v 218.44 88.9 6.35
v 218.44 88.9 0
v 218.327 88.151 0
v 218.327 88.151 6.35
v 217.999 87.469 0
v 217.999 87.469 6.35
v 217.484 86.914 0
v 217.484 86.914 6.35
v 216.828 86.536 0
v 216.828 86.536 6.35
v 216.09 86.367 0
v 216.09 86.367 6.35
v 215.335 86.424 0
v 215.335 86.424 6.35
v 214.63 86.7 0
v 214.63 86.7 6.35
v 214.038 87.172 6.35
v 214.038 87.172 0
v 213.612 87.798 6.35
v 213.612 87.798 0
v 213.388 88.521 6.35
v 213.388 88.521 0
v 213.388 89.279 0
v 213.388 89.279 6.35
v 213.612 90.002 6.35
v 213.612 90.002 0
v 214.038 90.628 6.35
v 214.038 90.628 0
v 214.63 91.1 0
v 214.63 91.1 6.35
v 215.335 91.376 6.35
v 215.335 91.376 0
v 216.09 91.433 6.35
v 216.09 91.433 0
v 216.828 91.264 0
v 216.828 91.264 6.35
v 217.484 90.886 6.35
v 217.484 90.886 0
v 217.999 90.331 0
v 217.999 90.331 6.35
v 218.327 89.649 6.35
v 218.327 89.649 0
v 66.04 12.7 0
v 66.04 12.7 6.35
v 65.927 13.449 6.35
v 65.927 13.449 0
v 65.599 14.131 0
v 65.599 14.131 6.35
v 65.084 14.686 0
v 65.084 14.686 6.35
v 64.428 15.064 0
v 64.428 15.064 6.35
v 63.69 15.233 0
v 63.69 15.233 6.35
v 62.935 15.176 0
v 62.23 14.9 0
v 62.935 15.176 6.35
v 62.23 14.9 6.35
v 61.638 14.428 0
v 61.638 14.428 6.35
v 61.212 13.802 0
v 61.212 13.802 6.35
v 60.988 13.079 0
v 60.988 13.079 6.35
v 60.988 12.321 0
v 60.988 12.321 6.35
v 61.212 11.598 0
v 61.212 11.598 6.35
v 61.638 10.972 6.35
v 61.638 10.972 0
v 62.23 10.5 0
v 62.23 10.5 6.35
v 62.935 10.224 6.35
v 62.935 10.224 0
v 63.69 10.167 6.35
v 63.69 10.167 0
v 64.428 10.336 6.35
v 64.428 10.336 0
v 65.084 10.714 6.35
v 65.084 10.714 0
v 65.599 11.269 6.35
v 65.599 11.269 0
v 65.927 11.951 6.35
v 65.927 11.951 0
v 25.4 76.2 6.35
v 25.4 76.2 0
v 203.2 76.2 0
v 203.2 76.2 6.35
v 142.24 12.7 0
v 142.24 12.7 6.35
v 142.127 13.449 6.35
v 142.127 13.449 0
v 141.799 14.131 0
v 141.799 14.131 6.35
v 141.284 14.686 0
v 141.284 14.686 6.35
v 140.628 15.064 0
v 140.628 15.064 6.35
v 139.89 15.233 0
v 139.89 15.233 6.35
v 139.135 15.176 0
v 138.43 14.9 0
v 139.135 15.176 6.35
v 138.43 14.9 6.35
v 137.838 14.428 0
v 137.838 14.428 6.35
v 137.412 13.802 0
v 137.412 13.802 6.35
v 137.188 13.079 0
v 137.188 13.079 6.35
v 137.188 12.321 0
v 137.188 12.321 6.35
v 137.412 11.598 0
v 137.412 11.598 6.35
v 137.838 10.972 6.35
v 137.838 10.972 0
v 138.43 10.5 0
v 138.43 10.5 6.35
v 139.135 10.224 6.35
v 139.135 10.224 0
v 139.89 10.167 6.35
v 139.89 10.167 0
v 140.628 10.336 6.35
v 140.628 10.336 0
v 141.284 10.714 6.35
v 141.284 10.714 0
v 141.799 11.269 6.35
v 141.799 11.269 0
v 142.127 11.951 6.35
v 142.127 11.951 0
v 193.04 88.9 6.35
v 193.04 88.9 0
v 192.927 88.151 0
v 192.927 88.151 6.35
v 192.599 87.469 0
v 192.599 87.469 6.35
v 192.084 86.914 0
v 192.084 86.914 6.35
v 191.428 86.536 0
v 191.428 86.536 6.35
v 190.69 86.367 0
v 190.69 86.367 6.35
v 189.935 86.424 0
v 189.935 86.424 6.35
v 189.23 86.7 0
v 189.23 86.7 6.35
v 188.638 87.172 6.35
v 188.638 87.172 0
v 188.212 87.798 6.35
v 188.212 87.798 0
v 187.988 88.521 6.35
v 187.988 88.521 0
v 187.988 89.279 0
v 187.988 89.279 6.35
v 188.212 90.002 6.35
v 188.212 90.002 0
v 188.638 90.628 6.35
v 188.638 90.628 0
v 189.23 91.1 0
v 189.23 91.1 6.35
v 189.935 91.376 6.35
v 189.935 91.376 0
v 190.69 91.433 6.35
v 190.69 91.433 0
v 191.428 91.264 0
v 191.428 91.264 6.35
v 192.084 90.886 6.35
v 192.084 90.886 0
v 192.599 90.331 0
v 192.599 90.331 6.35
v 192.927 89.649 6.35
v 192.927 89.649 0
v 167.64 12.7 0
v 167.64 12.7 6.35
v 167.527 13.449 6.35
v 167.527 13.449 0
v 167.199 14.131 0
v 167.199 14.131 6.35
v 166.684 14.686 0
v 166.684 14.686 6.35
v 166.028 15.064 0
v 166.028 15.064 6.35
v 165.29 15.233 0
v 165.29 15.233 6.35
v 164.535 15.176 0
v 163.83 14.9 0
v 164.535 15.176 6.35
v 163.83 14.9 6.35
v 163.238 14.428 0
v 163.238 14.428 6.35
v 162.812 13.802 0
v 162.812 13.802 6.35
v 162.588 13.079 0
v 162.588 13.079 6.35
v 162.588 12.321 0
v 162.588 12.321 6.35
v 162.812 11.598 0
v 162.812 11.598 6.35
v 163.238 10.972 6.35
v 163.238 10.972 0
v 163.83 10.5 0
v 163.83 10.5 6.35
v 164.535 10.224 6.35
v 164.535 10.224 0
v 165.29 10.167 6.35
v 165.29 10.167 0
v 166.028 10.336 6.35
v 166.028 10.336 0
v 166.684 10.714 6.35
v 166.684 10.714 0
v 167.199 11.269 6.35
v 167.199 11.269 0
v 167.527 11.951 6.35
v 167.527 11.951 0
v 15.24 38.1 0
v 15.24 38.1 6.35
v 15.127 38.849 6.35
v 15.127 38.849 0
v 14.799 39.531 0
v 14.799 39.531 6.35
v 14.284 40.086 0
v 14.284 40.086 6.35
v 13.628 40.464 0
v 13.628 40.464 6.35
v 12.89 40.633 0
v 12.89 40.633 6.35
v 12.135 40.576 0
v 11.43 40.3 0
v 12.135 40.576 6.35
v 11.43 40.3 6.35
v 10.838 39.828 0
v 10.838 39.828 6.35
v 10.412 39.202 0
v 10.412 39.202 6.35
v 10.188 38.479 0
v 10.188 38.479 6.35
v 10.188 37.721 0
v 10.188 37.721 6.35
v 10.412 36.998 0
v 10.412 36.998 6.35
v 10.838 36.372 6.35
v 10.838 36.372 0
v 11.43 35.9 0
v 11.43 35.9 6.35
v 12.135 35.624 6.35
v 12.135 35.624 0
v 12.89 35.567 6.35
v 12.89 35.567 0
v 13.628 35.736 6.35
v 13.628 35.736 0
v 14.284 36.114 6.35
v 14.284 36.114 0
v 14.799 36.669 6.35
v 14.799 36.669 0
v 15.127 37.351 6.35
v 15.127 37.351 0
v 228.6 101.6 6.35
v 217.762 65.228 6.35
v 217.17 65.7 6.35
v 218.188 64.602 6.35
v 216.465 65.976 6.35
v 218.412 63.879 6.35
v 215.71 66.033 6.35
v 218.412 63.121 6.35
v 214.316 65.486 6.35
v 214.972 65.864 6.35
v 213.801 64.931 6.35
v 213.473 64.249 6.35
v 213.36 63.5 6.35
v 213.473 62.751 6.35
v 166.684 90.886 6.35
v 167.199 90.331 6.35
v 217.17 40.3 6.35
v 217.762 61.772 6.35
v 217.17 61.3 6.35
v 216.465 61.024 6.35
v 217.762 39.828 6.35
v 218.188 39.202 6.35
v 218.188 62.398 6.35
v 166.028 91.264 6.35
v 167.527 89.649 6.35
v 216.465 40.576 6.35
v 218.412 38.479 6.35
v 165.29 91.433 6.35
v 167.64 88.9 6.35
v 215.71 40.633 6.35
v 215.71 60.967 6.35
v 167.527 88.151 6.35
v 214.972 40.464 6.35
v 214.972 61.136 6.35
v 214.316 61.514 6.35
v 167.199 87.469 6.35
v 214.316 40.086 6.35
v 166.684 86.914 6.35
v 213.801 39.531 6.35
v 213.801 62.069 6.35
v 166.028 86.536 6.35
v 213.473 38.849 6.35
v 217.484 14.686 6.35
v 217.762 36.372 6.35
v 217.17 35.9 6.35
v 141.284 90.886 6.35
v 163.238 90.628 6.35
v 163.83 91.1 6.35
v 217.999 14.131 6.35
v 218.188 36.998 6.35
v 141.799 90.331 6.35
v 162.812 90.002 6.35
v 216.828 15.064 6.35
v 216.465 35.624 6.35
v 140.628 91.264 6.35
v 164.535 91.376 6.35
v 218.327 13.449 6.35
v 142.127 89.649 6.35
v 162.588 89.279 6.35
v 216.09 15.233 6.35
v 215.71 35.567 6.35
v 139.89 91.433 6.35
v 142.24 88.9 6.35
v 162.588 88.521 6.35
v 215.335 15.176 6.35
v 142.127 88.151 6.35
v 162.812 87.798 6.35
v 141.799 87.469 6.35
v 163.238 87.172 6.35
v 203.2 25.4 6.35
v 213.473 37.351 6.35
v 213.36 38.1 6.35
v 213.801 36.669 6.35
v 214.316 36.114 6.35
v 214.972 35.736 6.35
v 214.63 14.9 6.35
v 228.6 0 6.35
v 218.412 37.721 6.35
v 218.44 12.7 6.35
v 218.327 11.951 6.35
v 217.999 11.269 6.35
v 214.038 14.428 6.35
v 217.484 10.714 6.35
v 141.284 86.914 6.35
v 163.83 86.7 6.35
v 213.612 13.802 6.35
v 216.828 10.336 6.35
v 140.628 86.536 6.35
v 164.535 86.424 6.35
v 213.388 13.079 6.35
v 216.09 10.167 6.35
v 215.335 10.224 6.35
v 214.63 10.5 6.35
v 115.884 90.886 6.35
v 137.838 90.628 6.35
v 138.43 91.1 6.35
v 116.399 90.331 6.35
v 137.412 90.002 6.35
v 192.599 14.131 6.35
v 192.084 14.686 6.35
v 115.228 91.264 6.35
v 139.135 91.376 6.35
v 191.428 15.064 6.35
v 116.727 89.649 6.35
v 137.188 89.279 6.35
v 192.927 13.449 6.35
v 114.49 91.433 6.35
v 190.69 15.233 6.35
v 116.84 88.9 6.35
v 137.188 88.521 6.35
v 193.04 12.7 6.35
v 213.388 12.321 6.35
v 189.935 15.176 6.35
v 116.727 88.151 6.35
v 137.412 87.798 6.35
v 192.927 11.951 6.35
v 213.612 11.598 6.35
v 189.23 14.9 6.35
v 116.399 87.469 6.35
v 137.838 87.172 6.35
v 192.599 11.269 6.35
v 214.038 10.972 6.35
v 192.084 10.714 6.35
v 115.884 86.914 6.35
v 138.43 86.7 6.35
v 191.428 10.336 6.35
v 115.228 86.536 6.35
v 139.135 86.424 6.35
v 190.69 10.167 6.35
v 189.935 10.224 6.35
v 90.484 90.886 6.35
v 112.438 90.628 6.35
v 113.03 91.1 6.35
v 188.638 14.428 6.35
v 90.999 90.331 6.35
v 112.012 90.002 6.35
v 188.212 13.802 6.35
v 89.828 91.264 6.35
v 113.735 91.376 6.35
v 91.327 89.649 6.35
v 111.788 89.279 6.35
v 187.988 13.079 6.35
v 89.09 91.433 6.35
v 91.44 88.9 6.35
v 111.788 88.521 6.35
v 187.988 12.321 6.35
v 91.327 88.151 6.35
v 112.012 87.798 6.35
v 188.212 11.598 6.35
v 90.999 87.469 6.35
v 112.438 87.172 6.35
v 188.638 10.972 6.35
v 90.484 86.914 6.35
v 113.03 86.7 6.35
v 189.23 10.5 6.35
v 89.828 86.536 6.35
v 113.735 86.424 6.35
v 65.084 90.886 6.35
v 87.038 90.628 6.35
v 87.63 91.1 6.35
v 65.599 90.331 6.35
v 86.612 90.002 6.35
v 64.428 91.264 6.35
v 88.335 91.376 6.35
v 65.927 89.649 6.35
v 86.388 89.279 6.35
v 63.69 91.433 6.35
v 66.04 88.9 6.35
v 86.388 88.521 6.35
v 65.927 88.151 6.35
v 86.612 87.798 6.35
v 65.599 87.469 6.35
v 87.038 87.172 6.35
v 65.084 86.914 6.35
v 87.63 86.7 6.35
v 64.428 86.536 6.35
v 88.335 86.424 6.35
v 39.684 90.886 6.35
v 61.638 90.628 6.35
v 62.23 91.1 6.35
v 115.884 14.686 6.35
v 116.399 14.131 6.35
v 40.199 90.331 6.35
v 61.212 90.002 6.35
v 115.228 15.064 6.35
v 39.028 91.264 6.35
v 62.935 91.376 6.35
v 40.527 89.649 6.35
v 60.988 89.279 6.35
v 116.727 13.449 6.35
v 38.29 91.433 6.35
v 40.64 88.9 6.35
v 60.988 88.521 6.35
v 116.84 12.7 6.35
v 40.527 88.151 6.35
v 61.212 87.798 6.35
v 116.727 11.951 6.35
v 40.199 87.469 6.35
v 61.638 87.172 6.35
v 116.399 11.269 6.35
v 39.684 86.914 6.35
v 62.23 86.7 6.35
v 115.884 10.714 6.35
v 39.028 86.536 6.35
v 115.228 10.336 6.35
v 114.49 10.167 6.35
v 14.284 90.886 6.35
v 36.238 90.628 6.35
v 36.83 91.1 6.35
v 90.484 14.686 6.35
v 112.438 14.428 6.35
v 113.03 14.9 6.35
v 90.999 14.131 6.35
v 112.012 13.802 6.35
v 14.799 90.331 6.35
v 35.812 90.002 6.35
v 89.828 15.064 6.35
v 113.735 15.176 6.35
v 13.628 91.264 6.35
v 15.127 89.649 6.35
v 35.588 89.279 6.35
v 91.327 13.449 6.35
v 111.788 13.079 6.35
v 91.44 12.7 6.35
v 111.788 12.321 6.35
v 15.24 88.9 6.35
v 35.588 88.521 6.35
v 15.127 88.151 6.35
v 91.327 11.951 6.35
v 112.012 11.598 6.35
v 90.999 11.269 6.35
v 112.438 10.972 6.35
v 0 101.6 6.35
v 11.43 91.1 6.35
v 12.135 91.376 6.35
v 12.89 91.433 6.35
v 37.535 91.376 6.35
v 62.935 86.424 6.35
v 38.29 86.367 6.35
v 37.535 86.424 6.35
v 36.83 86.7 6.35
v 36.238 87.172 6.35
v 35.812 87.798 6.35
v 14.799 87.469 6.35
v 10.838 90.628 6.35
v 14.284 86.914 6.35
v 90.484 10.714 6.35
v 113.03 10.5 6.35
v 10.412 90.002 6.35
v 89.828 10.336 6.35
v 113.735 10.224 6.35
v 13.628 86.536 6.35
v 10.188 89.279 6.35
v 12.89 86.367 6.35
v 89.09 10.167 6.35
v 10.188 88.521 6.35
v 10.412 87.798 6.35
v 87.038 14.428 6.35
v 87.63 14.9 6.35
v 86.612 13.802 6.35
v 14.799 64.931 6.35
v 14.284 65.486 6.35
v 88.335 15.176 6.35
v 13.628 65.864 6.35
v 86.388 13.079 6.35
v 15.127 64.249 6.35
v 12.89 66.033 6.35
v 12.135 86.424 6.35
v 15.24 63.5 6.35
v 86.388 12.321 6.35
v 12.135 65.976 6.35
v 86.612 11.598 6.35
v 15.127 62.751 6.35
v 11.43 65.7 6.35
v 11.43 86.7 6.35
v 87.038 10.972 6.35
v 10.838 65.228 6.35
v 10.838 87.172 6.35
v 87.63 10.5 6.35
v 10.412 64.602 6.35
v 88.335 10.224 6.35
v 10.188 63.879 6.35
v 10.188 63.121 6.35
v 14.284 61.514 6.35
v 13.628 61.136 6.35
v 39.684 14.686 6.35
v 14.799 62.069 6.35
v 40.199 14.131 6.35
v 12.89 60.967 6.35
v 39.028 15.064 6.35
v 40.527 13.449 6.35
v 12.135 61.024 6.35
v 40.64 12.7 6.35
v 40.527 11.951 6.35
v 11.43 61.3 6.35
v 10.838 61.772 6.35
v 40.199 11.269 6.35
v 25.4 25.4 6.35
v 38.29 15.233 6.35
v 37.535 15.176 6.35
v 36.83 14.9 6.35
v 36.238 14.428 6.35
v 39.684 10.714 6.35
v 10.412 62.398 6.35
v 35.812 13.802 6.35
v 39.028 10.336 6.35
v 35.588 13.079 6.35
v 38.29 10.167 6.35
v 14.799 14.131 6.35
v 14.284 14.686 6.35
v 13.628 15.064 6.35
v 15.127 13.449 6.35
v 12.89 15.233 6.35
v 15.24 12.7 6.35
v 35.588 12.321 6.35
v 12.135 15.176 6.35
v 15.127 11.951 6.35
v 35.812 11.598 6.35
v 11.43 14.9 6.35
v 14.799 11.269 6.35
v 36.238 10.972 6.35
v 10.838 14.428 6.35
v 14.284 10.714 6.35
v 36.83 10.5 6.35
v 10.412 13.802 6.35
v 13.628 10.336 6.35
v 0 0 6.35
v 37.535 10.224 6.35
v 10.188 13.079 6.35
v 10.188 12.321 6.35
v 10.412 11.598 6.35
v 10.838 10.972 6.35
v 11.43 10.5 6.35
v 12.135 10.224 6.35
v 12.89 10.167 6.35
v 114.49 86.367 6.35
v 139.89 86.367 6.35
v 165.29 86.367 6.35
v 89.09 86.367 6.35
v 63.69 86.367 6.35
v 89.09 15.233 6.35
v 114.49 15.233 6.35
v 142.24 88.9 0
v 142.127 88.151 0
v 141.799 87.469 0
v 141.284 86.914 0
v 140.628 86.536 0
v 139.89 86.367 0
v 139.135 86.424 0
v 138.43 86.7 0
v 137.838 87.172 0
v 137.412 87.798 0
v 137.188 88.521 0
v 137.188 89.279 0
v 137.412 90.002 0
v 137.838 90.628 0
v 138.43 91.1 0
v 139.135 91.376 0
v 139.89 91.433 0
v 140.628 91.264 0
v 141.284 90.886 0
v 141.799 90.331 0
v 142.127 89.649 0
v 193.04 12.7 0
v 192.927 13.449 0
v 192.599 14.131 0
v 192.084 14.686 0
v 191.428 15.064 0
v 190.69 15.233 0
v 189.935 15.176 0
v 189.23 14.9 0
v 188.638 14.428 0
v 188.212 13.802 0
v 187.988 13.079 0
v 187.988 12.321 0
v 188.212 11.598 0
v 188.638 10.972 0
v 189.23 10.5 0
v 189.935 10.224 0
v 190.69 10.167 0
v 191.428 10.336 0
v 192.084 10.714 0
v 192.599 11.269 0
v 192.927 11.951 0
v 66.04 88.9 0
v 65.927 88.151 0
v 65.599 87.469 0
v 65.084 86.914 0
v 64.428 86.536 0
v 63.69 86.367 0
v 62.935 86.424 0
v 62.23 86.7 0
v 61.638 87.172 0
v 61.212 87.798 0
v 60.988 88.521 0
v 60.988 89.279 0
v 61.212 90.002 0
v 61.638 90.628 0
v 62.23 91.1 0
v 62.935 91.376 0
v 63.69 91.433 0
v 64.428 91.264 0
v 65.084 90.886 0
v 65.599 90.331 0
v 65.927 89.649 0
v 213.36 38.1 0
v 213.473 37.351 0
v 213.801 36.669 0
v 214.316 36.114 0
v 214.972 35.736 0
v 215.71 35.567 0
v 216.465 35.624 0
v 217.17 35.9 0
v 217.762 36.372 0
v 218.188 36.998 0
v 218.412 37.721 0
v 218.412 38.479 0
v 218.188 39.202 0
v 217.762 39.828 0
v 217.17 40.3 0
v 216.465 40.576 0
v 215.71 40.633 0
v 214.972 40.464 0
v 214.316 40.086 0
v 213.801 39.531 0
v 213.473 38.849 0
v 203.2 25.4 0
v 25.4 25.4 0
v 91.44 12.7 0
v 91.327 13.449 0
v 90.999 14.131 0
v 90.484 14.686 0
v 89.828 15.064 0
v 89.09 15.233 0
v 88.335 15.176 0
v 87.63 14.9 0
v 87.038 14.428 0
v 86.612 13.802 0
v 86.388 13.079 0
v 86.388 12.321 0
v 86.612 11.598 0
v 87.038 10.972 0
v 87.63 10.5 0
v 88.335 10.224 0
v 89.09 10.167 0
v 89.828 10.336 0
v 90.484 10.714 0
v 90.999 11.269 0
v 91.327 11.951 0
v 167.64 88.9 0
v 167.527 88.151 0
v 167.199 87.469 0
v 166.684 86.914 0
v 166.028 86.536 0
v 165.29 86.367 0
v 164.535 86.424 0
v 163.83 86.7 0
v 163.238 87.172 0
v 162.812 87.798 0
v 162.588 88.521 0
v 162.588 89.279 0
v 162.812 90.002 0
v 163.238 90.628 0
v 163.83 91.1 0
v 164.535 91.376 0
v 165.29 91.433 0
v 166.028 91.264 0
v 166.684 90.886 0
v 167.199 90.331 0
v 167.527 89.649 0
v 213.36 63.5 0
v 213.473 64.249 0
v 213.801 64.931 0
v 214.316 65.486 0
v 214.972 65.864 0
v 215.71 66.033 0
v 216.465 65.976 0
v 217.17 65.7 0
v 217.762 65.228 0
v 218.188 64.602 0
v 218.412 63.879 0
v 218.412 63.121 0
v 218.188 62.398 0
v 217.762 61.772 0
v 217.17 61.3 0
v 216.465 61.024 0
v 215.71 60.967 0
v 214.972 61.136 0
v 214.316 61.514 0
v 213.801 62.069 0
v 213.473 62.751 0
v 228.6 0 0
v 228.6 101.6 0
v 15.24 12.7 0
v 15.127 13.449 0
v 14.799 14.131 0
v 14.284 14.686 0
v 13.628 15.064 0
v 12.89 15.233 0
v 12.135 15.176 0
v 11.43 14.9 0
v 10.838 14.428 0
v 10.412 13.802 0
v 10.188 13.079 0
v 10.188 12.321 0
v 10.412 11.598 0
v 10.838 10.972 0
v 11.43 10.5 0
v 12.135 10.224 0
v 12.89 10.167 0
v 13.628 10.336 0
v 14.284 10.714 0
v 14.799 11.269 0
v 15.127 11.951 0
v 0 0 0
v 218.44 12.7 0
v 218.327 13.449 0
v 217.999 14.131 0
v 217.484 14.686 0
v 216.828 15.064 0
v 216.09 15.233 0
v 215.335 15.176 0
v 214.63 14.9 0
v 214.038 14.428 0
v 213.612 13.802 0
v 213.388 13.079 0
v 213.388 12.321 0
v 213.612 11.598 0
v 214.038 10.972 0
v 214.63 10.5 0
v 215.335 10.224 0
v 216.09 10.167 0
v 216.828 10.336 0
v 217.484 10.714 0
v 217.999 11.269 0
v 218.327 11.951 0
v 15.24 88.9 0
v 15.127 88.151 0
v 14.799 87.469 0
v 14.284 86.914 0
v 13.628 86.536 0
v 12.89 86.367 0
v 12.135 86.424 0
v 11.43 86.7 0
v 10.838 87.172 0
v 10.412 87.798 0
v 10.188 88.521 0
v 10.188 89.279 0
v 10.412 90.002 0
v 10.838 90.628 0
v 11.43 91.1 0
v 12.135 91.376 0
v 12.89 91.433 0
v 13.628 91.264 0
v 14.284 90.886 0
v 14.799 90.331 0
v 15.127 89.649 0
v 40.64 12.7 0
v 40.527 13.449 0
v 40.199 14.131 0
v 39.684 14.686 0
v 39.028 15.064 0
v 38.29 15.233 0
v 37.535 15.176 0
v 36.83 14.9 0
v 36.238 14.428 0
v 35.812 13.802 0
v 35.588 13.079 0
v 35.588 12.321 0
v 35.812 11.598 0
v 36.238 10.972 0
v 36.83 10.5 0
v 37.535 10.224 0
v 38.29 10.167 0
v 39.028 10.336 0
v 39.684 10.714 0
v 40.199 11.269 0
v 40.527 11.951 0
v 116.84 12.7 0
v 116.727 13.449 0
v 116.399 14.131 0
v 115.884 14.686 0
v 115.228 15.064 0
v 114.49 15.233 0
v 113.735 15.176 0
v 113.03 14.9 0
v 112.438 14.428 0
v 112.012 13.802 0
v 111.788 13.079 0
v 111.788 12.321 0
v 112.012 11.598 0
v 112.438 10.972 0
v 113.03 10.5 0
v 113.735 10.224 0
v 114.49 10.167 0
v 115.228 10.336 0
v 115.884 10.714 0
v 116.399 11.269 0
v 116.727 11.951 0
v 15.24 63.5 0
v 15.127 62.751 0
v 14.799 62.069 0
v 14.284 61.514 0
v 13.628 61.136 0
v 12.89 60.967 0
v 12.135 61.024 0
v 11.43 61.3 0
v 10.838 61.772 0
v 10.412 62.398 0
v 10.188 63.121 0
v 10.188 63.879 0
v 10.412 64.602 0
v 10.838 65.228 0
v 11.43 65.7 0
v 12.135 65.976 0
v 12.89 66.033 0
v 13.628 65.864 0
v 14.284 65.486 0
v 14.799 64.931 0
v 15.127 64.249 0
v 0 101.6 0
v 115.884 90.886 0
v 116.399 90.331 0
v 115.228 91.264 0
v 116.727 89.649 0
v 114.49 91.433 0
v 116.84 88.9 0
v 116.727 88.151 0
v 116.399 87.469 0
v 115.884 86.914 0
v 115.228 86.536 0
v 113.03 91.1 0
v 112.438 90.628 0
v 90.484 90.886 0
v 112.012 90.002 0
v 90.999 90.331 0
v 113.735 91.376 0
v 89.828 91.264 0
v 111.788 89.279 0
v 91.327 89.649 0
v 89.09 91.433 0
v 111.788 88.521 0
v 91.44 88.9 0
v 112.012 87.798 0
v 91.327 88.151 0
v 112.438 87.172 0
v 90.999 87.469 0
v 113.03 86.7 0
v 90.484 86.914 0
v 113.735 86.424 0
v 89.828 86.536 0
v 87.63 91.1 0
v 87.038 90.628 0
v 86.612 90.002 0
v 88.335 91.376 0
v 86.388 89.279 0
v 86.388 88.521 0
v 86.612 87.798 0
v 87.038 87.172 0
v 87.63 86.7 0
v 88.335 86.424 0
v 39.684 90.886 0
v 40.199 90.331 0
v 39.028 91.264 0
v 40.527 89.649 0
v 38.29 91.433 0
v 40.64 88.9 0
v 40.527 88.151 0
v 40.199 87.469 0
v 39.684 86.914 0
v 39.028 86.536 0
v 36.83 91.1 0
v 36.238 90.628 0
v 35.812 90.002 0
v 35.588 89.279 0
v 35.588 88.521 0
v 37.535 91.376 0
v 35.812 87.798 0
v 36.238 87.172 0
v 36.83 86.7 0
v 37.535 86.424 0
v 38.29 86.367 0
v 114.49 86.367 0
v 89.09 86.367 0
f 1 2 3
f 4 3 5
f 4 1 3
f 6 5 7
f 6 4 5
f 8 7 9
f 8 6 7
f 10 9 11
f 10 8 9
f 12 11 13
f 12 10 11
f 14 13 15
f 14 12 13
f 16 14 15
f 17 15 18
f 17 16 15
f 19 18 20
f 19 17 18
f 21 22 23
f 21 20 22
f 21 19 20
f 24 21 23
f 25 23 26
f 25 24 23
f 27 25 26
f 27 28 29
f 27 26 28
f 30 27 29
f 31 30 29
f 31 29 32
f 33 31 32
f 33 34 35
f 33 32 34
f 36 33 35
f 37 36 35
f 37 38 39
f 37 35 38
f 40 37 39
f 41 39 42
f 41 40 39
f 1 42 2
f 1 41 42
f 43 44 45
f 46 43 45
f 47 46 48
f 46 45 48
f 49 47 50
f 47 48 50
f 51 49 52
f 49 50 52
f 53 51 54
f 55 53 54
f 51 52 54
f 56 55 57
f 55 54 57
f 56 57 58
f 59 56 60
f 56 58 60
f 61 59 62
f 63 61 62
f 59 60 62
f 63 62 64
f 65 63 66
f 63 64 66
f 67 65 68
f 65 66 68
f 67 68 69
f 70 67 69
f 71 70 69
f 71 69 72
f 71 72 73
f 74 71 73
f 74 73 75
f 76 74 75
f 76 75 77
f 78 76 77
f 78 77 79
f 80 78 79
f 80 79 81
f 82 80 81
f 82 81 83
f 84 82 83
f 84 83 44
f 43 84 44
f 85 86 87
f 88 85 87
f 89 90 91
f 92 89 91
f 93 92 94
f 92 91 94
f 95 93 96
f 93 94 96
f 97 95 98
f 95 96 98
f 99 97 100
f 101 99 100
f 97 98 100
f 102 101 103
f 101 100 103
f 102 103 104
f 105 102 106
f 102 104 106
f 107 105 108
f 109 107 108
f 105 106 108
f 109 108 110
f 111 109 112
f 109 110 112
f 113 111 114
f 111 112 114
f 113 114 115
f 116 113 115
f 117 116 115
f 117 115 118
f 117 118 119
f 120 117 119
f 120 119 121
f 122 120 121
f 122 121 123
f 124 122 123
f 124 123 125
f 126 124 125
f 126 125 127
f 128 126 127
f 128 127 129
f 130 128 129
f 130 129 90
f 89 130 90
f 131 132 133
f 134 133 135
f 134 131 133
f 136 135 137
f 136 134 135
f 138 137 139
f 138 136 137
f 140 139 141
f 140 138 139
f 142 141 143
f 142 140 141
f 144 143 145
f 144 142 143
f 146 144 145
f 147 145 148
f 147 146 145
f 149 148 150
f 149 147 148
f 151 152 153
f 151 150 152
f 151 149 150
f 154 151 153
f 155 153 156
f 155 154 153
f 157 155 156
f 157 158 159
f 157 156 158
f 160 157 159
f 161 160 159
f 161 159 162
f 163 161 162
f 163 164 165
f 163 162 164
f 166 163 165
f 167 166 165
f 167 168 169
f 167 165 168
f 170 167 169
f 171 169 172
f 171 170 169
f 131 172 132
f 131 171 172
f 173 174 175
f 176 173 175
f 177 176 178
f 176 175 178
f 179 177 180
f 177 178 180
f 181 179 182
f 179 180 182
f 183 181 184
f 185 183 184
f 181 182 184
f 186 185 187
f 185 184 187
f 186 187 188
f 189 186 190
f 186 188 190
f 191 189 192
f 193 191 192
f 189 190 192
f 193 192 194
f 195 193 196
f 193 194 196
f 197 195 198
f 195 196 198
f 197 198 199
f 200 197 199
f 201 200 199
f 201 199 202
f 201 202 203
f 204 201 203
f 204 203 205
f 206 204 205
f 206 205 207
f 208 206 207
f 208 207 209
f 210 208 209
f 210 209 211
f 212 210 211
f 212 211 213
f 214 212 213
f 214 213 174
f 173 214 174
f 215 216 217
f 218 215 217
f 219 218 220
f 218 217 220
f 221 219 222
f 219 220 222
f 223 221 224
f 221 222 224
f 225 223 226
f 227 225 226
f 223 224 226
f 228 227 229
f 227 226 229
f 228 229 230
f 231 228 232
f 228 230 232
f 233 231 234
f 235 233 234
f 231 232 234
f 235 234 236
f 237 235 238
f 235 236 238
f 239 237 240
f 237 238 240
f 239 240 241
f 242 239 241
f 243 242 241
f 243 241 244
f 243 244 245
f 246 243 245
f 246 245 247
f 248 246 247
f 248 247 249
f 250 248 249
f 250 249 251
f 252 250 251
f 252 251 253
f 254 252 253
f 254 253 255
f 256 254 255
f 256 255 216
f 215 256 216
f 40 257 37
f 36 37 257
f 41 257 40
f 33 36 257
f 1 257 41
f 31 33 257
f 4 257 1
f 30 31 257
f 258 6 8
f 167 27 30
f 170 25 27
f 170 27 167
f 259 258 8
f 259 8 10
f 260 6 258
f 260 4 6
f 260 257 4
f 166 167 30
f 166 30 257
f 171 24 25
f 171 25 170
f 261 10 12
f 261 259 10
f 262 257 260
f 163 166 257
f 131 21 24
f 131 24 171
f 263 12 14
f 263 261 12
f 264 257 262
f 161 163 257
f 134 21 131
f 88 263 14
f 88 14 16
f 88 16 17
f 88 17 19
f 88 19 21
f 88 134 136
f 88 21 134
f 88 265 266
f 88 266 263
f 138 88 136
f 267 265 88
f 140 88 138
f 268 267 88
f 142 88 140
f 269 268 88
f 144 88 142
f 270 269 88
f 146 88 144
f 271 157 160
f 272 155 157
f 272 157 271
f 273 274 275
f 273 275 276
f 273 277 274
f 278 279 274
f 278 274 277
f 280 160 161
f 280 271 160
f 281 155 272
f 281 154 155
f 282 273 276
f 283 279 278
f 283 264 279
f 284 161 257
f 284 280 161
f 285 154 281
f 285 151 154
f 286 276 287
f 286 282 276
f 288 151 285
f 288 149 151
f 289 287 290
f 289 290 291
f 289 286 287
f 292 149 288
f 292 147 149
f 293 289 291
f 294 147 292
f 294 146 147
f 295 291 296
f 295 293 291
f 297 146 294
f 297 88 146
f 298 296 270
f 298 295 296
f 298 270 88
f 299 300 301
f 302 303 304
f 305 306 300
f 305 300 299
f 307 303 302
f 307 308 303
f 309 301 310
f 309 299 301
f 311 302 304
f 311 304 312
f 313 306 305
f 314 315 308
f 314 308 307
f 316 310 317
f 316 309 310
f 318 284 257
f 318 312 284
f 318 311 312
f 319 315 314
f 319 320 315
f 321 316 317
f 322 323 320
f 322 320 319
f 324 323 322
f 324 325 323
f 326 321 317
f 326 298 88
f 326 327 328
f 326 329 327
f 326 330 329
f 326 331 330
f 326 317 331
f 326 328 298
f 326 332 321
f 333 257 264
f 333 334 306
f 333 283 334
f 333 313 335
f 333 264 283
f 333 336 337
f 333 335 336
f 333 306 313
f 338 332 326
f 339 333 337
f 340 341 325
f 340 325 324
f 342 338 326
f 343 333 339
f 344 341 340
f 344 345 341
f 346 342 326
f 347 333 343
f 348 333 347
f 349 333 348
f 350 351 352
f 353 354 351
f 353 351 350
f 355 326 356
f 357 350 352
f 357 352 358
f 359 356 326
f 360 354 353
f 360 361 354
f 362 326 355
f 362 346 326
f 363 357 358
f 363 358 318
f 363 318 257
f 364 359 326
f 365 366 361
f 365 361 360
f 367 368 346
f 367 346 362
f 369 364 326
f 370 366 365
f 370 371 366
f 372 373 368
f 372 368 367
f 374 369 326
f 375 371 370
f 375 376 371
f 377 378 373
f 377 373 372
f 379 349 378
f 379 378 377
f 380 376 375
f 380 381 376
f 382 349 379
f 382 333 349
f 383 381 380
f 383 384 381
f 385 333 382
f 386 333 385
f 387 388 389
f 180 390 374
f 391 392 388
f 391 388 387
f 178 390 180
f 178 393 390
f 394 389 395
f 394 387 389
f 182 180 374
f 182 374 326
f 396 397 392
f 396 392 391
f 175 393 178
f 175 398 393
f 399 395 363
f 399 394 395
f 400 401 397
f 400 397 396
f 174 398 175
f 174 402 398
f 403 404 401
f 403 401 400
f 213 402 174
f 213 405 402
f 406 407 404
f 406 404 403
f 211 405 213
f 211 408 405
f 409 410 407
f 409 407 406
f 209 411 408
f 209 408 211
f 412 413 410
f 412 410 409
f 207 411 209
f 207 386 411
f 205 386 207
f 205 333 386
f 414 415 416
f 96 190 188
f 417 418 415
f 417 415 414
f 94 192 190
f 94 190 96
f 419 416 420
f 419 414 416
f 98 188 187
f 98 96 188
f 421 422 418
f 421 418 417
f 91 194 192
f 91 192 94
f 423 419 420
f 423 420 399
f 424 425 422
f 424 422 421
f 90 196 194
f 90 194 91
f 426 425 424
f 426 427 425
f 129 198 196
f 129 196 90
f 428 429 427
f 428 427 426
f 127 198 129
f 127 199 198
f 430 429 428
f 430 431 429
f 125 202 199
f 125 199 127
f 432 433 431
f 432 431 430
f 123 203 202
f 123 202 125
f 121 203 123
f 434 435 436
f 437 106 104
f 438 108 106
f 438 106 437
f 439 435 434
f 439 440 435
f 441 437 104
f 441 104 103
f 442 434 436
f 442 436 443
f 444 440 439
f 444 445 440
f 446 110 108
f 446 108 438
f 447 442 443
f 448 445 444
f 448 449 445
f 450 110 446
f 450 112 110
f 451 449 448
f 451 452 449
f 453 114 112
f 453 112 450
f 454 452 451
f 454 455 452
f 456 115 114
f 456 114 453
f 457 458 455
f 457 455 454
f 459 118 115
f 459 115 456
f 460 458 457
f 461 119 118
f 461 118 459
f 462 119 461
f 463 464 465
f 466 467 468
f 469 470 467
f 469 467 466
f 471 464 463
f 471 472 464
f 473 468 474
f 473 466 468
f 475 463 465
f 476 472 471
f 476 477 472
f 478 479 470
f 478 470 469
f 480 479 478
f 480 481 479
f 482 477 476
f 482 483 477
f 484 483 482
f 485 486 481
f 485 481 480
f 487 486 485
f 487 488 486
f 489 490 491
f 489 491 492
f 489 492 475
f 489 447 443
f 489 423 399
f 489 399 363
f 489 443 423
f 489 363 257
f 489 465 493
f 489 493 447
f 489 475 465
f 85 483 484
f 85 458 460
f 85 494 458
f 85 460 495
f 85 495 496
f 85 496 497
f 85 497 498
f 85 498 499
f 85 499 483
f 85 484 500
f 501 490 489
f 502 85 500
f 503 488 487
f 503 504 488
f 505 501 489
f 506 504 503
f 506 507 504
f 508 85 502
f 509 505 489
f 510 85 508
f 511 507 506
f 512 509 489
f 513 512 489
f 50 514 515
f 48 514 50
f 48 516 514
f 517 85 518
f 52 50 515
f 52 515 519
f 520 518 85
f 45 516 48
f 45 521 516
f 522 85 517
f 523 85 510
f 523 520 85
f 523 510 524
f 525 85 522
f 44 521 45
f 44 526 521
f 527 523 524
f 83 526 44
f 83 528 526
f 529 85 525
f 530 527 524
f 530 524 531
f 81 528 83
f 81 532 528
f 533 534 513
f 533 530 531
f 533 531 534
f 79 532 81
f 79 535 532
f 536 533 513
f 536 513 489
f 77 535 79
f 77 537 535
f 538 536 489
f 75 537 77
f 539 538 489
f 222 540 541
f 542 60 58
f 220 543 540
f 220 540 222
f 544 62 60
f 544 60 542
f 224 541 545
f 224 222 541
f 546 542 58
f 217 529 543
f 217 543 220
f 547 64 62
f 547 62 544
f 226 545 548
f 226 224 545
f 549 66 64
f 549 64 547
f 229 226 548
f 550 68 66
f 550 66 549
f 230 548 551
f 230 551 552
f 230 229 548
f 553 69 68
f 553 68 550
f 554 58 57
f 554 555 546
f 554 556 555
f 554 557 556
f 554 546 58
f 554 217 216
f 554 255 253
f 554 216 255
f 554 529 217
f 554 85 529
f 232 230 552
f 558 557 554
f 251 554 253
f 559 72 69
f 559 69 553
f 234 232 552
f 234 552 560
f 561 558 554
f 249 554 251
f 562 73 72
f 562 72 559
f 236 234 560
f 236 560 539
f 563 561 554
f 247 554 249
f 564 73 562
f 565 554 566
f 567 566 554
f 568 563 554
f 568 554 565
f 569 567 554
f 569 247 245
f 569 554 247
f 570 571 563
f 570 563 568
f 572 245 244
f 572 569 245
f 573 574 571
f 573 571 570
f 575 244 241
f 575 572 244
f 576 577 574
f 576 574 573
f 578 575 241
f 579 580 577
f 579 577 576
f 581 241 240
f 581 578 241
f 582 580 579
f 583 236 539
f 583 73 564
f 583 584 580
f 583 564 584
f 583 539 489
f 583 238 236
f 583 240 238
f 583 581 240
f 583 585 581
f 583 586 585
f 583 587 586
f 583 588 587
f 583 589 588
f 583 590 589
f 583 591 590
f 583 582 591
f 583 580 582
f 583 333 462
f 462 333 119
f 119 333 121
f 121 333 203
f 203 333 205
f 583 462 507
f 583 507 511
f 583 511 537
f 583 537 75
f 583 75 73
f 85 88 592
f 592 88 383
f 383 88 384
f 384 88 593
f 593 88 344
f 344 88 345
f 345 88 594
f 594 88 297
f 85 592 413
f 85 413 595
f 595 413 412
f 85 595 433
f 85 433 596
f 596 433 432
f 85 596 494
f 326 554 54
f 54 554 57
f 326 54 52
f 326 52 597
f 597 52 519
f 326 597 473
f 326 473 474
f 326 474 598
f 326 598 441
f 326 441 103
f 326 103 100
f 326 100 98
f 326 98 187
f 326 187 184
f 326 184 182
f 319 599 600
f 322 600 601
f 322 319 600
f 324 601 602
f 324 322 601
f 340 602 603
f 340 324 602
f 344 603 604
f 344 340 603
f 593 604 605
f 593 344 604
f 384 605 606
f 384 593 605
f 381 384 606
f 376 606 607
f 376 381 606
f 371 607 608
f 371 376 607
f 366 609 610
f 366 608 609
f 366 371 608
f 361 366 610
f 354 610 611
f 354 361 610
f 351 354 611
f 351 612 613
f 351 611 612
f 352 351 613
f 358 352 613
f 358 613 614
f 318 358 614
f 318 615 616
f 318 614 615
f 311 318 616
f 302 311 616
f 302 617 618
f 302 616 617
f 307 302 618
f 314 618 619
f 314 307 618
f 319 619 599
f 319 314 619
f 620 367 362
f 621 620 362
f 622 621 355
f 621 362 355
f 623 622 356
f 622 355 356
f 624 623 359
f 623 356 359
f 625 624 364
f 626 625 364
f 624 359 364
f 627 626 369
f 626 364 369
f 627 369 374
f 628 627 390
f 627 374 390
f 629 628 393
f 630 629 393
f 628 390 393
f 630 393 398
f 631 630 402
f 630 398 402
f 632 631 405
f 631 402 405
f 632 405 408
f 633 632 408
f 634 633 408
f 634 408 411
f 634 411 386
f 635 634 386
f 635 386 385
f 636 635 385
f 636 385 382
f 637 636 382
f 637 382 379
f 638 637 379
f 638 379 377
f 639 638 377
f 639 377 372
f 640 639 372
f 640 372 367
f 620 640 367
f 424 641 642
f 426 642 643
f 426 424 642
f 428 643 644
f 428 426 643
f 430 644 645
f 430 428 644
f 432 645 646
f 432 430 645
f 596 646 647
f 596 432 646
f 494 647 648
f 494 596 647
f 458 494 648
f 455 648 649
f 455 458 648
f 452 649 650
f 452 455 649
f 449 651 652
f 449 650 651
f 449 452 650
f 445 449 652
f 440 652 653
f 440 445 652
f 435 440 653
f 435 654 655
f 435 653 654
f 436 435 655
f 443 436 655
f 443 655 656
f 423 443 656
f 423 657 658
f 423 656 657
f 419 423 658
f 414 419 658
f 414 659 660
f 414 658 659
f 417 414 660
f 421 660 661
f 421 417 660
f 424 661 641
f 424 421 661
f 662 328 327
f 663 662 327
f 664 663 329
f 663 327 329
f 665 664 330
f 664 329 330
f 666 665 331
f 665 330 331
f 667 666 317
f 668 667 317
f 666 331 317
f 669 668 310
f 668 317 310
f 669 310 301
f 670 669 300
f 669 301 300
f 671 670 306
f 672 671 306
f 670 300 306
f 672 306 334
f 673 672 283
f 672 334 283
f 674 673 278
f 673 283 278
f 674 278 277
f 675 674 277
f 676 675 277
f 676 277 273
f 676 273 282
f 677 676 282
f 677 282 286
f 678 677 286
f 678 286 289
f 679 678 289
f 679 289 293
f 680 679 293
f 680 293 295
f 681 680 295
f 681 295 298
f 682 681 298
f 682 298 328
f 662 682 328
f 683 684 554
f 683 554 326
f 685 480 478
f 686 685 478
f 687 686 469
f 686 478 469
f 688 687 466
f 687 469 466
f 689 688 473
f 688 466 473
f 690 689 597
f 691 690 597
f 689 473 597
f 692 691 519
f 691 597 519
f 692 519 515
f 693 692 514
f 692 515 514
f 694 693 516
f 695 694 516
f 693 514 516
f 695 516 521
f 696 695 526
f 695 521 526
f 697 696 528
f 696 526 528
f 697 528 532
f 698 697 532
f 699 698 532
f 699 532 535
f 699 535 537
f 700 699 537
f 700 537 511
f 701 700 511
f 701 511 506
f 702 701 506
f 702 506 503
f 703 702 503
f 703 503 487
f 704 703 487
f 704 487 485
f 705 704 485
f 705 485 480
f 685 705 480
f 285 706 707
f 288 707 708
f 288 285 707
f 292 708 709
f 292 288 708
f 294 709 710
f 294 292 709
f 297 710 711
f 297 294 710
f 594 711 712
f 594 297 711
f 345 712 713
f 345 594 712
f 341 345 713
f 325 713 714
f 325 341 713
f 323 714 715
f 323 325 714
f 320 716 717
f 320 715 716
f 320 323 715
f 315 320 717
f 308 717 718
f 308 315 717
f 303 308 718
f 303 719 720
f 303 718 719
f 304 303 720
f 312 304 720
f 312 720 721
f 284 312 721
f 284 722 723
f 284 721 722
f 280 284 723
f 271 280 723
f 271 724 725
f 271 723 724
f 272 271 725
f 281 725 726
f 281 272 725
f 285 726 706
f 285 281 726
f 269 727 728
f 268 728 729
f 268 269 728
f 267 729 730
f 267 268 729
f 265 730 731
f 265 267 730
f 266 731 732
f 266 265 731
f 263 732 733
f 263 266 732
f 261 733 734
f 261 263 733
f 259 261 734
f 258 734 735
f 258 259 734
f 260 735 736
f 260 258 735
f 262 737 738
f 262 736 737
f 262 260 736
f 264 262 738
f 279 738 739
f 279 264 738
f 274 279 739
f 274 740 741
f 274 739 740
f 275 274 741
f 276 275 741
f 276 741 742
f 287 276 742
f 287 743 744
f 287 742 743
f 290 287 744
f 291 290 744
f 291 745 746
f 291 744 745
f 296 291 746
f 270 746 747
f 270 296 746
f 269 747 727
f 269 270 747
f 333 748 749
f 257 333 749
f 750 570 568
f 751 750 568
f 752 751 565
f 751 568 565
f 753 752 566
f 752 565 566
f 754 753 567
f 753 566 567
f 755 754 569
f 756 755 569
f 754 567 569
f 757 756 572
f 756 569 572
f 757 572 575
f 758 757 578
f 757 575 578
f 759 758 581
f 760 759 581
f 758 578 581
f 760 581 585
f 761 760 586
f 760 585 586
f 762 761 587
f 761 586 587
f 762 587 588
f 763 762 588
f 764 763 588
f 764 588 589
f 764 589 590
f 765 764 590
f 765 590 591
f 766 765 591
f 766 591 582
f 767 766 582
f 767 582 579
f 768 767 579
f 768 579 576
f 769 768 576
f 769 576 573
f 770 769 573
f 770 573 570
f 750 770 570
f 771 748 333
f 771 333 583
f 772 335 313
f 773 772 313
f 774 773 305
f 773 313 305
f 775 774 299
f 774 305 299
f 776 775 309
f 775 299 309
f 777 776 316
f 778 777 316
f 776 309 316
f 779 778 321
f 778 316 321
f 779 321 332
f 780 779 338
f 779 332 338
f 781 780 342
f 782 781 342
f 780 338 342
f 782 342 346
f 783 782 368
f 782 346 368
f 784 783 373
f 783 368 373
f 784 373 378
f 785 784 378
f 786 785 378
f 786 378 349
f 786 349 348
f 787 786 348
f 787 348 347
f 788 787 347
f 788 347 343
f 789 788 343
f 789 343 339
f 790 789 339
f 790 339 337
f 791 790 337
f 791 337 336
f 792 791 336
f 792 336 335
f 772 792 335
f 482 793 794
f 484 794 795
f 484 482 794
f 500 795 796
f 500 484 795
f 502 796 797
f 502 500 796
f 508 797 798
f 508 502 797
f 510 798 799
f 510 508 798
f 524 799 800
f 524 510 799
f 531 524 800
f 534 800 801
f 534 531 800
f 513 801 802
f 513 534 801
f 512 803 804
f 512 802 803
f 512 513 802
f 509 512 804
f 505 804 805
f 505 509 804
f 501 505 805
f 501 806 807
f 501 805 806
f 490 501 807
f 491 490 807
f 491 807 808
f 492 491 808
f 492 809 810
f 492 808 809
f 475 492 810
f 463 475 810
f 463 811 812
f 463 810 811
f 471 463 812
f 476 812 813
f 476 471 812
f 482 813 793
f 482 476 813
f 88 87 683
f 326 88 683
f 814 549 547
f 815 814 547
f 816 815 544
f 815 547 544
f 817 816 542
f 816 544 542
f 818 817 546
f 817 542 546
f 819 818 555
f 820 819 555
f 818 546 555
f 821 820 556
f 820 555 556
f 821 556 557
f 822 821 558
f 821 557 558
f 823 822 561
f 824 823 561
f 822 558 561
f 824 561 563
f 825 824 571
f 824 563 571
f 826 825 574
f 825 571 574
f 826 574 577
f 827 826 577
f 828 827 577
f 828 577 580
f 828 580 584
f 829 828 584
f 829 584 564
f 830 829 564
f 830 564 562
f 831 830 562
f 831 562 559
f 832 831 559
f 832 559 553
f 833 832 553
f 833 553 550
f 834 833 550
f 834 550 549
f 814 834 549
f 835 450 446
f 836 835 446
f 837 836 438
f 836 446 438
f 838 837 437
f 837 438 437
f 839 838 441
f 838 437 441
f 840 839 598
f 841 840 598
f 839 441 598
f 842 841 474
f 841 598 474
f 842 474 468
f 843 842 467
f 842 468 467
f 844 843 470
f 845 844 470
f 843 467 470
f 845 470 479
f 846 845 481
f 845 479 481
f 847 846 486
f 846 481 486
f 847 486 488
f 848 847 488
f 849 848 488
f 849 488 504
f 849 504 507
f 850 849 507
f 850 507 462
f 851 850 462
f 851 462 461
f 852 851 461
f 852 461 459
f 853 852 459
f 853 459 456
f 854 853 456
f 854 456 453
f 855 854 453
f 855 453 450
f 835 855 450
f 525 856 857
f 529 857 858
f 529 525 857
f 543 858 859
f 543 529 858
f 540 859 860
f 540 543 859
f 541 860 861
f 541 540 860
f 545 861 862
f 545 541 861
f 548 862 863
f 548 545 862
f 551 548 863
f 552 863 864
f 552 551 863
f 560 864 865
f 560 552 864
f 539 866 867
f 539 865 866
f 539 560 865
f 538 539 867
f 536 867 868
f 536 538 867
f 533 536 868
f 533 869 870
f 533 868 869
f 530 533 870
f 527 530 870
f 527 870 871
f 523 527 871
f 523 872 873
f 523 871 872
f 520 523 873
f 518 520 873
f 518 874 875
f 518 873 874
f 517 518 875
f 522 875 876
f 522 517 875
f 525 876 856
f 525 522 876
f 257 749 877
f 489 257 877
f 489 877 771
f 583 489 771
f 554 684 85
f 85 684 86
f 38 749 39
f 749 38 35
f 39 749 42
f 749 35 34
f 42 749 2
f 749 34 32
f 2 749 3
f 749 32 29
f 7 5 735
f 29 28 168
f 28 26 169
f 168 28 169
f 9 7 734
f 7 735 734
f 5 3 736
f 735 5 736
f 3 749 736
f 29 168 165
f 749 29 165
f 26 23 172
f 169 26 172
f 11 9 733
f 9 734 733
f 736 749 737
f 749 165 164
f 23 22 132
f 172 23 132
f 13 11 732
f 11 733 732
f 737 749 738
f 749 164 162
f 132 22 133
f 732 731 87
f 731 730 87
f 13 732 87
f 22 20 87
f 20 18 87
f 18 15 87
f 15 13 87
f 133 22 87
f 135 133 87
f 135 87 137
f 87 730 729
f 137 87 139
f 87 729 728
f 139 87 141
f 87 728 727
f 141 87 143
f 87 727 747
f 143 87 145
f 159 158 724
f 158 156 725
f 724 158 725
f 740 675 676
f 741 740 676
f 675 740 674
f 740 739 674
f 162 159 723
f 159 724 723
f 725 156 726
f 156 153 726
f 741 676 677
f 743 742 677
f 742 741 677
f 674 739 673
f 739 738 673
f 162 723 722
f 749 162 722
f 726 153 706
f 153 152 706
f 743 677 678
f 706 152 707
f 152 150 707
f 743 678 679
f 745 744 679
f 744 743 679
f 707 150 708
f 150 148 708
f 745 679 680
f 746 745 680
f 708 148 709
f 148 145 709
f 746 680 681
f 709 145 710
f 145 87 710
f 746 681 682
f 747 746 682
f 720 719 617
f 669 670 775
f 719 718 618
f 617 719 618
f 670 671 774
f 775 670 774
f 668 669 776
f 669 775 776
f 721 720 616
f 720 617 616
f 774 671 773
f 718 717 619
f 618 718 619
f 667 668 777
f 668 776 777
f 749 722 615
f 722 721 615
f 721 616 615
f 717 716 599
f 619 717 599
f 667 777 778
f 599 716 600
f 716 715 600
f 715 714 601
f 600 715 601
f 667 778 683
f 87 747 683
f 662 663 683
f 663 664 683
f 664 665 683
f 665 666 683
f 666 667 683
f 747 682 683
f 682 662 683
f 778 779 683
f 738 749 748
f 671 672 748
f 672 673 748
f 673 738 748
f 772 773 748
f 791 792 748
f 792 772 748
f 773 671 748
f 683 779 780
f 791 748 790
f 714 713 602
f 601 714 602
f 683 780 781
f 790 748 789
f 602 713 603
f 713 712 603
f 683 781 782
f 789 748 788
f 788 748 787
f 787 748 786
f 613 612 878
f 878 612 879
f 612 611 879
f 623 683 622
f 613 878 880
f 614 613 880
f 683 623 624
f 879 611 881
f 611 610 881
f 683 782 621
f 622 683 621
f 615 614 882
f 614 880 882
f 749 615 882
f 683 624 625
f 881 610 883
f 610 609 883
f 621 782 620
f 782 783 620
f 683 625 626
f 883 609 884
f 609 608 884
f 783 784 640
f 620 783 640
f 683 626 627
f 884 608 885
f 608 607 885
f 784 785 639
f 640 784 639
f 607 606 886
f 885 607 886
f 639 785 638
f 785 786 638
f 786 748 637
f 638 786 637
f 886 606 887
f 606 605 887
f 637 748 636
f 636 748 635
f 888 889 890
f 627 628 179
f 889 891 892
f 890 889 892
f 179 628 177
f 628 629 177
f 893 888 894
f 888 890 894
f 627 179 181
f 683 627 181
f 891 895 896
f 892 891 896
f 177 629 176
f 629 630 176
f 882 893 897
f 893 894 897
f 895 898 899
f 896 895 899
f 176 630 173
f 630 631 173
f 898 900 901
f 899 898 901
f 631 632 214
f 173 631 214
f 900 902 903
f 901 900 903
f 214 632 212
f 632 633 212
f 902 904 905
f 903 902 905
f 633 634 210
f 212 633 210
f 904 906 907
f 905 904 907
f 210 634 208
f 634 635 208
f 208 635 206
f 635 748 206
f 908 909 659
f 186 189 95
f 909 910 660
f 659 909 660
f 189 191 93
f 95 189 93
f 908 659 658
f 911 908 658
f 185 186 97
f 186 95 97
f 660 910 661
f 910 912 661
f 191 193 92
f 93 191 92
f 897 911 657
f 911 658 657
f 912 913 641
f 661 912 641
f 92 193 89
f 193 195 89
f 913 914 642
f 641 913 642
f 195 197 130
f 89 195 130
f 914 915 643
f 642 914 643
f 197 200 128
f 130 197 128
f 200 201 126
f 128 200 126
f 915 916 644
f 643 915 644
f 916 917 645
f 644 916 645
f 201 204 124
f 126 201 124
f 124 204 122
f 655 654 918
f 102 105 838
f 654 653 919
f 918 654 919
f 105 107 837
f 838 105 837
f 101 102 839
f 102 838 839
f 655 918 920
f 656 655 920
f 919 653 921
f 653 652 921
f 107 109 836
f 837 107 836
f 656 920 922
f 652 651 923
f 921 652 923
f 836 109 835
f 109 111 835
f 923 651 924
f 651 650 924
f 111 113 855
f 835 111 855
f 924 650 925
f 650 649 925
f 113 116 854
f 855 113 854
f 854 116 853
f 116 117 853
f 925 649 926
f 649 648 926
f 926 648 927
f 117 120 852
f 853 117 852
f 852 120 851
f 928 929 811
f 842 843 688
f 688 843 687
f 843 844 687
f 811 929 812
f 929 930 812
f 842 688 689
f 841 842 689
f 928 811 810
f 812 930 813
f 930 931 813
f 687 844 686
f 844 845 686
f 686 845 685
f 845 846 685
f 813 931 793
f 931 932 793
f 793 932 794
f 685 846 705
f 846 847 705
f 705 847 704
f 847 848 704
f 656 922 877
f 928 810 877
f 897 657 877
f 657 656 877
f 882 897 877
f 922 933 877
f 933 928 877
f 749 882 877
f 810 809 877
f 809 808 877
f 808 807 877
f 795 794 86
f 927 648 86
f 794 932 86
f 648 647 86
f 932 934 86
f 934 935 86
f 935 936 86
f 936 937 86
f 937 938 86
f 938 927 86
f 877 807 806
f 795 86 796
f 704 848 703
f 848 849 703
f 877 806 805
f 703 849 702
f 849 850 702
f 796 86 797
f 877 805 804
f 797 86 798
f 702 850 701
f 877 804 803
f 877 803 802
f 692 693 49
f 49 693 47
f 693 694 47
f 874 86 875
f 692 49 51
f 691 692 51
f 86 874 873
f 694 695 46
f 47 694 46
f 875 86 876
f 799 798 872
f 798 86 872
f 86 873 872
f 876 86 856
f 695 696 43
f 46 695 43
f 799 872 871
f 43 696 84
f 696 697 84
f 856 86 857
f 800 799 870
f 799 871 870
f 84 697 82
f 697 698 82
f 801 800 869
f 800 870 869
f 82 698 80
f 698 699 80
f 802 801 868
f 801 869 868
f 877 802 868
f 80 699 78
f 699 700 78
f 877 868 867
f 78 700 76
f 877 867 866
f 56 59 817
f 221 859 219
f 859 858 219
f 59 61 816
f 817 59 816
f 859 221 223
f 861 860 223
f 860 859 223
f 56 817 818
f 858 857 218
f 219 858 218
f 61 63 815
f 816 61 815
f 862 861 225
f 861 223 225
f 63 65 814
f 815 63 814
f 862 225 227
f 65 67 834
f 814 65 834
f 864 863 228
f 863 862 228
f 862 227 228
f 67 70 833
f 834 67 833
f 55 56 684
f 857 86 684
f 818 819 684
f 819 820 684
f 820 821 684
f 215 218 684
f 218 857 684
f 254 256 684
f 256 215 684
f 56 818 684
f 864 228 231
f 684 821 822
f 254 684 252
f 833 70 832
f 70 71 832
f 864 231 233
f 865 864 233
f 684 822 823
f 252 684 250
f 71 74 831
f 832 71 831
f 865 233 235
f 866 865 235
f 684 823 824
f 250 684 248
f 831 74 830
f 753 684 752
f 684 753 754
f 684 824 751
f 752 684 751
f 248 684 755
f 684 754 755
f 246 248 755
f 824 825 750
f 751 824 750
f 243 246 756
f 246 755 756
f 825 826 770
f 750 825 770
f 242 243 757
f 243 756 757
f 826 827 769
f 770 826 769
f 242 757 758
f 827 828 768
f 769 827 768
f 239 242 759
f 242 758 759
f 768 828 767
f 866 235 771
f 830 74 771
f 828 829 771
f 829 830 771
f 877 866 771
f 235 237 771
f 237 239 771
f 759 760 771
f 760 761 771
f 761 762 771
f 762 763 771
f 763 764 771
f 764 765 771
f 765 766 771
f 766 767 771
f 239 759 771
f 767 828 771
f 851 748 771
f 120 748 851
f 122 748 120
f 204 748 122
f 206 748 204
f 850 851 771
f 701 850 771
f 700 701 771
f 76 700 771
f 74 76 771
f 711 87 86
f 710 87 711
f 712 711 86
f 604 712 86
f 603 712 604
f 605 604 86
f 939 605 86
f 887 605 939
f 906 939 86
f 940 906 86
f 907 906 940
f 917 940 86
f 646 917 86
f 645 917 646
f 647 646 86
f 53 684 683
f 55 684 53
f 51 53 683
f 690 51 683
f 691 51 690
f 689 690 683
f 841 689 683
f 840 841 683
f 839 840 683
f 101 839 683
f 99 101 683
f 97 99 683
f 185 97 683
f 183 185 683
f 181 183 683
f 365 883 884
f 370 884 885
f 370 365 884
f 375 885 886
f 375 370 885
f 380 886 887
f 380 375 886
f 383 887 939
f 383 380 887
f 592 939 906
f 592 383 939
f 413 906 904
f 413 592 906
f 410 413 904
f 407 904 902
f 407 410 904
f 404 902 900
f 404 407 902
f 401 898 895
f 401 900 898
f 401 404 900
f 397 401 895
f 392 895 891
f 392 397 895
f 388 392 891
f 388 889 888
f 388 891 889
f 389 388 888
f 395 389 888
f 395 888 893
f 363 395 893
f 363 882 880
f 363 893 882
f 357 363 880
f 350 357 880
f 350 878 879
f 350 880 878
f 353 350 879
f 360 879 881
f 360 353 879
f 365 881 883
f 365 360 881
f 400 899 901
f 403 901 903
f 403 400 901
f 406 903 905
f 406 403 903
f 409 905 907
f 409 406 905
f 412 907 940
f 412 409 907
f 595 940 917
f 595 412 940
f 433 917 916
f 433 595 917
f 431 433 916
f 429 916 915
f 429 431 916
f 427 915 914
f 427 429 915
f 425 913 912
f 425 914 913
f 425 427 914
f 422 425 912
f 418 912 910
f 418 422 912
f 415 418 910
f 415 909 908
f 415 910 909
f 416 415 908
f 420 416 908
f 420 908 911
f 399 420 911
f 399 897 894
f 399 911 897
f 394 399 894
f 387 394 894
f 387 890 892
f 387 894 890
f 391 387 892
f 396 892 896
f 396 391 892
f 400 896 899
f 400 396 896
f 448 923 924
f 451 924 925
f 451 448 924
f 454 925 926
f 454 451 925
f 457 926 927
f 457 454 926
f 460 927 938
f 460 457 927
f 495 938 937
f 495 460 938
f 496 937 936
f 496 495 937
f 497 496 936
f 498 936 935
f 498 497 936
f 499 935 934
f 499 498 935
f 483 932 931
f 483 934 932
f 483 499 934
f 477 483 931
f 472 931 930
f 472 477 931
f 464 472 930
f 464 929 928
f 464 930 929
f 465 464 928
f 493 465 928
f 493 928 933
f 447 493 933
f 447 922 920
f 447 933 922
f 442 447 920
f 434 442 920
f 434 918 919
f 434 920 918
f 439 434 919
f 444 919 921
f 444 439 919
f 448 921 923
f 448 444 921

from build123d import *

# Parameters (mm, degrees)
BOSS_EXTRUDE1_DEPTH = 6.35
SKETCH2_R           = 2.54
CUT_EXTRUDE1_DEPTH  = 235.26250767


with BuildPart() as part:
    # Sketch1 → Boss-Extrude1 (new body)
    with BuildSketch(Plane.XY):
        Polygon((0, 0), (0, 50.8), (25.4, 50.8), (25.4, 25.4), (203.2, 25.4), (203.2, 50.8), (228.6, 50.8), (228.6, 0), align=None)
    boss_extrude1 = extrude(amount=BOSS_EXTRUDE1_DEPTH)

    # Sketch2 → Cut-Extrude1 (cut, through all)
    with BuildSketch(Plane.XY.offset(6.35)):
        with Locations((12.7, 38.1)):
            Circle(SKETCH2_R)
        with Locations((12.7, 12.7)):
            Circle(SKETCH2_R)
        with Locations((38.1, 12.7)):
            Circle(SKETCH2_R)
        with Locations((63.5, 12.7)):
            Circle(SKETCH2_R)
        with Locations((88.9, 12.7)):
            Circle(SKETCH2_R)
        with Locations((114.3, 12.7)):
            Circle(SKETCH2_R)
        with Locations((139.7, 12.7)):
            Circle(SKETCH2_R)
        with Locations((165.1, 12.7)):
            Circle(SKETCH2_R)
        with Locations((190.5, 12.7)):
            Circle(SKETCH2_R)
        with Locations((215.9, 12.7)):
            Circle(SKETCH2_R)
        with Locations(Location((215.9, 38.1, 0), (0, 0, 180))):
            Circle(SKETCH2_R)
    cut_extrude1 = extrude(amount=-CUT_EXTRUDE1_DEPTH, mode=Mode.SUBTRACT)

    # Mirror2: Boss-Extrude1, Cut-Extrude1 across plane
    add(boss_extrude1.mirror(Plane(origin=(0, 50.8, 6.35), x_dir=(0, 0, 1), z_dir=(0, -1, 0))))
    add(cut_extrude1.mirror(Plane(origin=(0, 50.8, 6.35), x_dir=(0, 0, 1), z_dir=(0, -1, 0))), mode=Mode.SUBTRACT)


solid = part.part
